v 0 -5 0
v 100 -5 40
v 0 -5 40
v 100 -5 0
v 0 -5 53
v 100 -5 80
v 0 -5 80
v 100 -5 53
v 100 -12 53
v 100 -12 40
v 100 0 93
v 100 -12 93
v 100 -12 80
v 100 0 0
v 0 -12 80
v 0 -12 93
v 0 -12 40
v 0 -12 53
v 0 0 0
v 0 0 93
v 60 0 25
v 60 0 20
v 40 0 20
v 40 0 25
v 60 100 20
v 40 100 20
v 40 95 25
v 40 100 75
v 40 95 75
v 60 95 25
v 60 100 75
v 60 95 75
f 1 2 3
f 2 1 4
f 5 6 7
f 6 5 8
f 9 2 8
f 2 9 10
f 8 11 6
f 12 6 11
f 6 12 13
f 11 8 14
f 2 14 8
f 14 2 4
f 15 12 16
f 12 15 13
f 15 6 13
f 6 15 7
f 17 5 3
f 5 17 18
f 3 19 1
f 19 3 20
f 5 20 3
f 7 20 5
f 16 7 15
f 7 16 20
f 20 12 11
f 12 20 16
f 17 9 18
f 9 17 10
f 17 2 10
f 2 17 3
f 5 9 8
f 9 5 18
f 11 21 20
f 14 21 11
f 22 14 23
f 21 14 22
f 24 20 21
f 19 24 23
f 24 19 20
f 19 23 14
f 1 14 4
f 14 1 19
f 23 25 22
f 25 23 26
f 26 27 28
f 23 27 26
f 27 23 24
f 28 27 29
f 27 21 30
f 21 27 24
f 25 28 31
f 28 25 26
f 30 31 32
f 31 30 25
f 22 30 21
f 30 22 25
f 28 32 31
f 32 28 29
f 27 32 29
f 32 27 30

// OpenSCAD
// file: ../Library/GeneralBracket.scad
HOLE_HEIGHT = 13;
HOLE_THICKNESS = 7;
WOOD_SLAB_HEIGHT = 27;

function BracketHeight(number_of_bracket) = ((HOLE_HEIGHT + WOOD_SLAB_HEIGHT)*(number_of_bracket))+ HOLE_HEIGHT;

module GeneralBracket(number_of_bracket, width, thickness)
{
    height = BracketHeight(number_of_bracket);
    
    linear_extrude(thickness)
    square([width,height]);
    
    for(i = [0:number_of_bracket-1])
        translate([0,(HOLE_HEIGHT + WOOD_SLAB_HEIGHT)*i, thickness])
        linear_extrude(HOLE_THICKNESS)
        square([width, HOLE_HEIGHT]);
}
// main file
include <../Library/GeneralBracket.scad>

GENERAL_THICKNESS = 5;
BRACKET_WIDTH = 100;
BRACKET_HOOK_Z = 20;
HOOK_ARM_Z = 50;
HOOK_HEIGHT = 100;
HOOK_WIDTH = 20;
NUMBER_OF_BRACKET = 2;

/* [ Hidden ] */

BRACKET_HOOK_WIDTH = (BRACKET_WIDTH/2)-(HOOK_WIDTH/2);

union()
{   
    translate([BRACKET_WIDTH, 0, BracketHeight(NUMBER_OF_BRACKET)])
    rotate([90,180,0])
    GeneralBracket(NUMBER_OF_BRACKET, BRACKET_WIDTH, GENERAL_THICKNESS);
    translate([BRACKET_HOOK_WIDTH,0,BRACKET_HOOK_Z])
    linear_extrude(GENERAL_THICKNESS)
    square([HOOK_WIDTH, HOOK_HEIGHT]);
    translate([BRACKET_HOOK_WIDTH,HOOK_HEIGHT,BRACKET_HOOK_Z+GENERAL_THICKNESS])
    rotate([90,0,0])
    linear_extrude(GENERAL_THICKNESS)
    square([HOOK_WIDTH, HOOK_ARM_Z]);
}
